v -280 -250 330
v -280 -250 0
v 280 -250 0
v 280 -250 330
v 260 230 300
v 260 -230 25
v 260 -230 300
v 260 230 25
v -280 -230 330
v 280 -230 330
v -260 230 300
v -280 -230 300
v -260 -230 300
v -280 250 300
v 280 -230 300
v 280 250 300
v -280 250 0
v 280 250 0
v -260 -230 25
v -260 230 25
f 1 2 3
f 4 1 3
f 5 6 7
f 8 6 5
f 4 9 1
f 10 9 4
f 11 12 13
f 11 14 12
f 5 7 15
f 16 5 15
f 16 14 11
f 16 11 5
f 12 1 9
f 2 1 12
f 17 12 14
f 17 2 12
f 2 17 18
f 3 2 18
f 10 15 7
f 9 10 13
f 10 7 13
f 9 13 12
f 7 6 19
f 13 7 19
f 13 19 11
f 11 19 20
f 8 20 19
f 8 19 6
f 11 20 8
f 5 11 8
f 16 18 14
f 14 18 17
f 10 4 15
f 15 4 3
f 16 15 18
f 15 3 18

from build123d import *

# Parameters (mm, degrees)
F0_W     = 20
F0_H     = 460
F0_H_2   = 20
F0_W_2   = 520
F1_DEPTH = 300
F2_DEPTH = 330
F3_DEPTH = 25


with BuildPart() as f1:
    # F0 (on Top) → F1 (new body)
    with BuildSketch(Plane.XY):
        with Locations((-270, 0)):
            Rectangle(F0_W, F0_H)
        with Locations((-270, 240)):
            Rectangle(F0_W, F0_H_2)
        with Locations((0, 240)):
            Rectangle(F0_W_2, F0_H_2)
        with Locations((270, 240)):
            Rectangle(F0_W, F0_H_2)
        with Locations((270, 0)):
            Rectangle(F0_W, F0_H)
    extrude(amount=F1_DEPTH)

    # F0 (on Top) → F2 (join)
    with BuildSketch(Plane.XY):
        with Locations((270, -240)):
            Rectangle(F0_W, F0_H_2)
        with Locations((0, -240)):
            Rectangle(F0_W_2, F0_H_2)
        with Locations((-270, -240)):
            Rectangle(F0_W, F0_H_2)
    extrude(amount=F2_DEPTH)

    # F0 (on Top) → F3 (join)
    with BuildSketch(Plane.XY):
        Rectangle(F0_W_2, F0_H)
    extrude(amount=F3_DEPTH)


solid = f1.part
